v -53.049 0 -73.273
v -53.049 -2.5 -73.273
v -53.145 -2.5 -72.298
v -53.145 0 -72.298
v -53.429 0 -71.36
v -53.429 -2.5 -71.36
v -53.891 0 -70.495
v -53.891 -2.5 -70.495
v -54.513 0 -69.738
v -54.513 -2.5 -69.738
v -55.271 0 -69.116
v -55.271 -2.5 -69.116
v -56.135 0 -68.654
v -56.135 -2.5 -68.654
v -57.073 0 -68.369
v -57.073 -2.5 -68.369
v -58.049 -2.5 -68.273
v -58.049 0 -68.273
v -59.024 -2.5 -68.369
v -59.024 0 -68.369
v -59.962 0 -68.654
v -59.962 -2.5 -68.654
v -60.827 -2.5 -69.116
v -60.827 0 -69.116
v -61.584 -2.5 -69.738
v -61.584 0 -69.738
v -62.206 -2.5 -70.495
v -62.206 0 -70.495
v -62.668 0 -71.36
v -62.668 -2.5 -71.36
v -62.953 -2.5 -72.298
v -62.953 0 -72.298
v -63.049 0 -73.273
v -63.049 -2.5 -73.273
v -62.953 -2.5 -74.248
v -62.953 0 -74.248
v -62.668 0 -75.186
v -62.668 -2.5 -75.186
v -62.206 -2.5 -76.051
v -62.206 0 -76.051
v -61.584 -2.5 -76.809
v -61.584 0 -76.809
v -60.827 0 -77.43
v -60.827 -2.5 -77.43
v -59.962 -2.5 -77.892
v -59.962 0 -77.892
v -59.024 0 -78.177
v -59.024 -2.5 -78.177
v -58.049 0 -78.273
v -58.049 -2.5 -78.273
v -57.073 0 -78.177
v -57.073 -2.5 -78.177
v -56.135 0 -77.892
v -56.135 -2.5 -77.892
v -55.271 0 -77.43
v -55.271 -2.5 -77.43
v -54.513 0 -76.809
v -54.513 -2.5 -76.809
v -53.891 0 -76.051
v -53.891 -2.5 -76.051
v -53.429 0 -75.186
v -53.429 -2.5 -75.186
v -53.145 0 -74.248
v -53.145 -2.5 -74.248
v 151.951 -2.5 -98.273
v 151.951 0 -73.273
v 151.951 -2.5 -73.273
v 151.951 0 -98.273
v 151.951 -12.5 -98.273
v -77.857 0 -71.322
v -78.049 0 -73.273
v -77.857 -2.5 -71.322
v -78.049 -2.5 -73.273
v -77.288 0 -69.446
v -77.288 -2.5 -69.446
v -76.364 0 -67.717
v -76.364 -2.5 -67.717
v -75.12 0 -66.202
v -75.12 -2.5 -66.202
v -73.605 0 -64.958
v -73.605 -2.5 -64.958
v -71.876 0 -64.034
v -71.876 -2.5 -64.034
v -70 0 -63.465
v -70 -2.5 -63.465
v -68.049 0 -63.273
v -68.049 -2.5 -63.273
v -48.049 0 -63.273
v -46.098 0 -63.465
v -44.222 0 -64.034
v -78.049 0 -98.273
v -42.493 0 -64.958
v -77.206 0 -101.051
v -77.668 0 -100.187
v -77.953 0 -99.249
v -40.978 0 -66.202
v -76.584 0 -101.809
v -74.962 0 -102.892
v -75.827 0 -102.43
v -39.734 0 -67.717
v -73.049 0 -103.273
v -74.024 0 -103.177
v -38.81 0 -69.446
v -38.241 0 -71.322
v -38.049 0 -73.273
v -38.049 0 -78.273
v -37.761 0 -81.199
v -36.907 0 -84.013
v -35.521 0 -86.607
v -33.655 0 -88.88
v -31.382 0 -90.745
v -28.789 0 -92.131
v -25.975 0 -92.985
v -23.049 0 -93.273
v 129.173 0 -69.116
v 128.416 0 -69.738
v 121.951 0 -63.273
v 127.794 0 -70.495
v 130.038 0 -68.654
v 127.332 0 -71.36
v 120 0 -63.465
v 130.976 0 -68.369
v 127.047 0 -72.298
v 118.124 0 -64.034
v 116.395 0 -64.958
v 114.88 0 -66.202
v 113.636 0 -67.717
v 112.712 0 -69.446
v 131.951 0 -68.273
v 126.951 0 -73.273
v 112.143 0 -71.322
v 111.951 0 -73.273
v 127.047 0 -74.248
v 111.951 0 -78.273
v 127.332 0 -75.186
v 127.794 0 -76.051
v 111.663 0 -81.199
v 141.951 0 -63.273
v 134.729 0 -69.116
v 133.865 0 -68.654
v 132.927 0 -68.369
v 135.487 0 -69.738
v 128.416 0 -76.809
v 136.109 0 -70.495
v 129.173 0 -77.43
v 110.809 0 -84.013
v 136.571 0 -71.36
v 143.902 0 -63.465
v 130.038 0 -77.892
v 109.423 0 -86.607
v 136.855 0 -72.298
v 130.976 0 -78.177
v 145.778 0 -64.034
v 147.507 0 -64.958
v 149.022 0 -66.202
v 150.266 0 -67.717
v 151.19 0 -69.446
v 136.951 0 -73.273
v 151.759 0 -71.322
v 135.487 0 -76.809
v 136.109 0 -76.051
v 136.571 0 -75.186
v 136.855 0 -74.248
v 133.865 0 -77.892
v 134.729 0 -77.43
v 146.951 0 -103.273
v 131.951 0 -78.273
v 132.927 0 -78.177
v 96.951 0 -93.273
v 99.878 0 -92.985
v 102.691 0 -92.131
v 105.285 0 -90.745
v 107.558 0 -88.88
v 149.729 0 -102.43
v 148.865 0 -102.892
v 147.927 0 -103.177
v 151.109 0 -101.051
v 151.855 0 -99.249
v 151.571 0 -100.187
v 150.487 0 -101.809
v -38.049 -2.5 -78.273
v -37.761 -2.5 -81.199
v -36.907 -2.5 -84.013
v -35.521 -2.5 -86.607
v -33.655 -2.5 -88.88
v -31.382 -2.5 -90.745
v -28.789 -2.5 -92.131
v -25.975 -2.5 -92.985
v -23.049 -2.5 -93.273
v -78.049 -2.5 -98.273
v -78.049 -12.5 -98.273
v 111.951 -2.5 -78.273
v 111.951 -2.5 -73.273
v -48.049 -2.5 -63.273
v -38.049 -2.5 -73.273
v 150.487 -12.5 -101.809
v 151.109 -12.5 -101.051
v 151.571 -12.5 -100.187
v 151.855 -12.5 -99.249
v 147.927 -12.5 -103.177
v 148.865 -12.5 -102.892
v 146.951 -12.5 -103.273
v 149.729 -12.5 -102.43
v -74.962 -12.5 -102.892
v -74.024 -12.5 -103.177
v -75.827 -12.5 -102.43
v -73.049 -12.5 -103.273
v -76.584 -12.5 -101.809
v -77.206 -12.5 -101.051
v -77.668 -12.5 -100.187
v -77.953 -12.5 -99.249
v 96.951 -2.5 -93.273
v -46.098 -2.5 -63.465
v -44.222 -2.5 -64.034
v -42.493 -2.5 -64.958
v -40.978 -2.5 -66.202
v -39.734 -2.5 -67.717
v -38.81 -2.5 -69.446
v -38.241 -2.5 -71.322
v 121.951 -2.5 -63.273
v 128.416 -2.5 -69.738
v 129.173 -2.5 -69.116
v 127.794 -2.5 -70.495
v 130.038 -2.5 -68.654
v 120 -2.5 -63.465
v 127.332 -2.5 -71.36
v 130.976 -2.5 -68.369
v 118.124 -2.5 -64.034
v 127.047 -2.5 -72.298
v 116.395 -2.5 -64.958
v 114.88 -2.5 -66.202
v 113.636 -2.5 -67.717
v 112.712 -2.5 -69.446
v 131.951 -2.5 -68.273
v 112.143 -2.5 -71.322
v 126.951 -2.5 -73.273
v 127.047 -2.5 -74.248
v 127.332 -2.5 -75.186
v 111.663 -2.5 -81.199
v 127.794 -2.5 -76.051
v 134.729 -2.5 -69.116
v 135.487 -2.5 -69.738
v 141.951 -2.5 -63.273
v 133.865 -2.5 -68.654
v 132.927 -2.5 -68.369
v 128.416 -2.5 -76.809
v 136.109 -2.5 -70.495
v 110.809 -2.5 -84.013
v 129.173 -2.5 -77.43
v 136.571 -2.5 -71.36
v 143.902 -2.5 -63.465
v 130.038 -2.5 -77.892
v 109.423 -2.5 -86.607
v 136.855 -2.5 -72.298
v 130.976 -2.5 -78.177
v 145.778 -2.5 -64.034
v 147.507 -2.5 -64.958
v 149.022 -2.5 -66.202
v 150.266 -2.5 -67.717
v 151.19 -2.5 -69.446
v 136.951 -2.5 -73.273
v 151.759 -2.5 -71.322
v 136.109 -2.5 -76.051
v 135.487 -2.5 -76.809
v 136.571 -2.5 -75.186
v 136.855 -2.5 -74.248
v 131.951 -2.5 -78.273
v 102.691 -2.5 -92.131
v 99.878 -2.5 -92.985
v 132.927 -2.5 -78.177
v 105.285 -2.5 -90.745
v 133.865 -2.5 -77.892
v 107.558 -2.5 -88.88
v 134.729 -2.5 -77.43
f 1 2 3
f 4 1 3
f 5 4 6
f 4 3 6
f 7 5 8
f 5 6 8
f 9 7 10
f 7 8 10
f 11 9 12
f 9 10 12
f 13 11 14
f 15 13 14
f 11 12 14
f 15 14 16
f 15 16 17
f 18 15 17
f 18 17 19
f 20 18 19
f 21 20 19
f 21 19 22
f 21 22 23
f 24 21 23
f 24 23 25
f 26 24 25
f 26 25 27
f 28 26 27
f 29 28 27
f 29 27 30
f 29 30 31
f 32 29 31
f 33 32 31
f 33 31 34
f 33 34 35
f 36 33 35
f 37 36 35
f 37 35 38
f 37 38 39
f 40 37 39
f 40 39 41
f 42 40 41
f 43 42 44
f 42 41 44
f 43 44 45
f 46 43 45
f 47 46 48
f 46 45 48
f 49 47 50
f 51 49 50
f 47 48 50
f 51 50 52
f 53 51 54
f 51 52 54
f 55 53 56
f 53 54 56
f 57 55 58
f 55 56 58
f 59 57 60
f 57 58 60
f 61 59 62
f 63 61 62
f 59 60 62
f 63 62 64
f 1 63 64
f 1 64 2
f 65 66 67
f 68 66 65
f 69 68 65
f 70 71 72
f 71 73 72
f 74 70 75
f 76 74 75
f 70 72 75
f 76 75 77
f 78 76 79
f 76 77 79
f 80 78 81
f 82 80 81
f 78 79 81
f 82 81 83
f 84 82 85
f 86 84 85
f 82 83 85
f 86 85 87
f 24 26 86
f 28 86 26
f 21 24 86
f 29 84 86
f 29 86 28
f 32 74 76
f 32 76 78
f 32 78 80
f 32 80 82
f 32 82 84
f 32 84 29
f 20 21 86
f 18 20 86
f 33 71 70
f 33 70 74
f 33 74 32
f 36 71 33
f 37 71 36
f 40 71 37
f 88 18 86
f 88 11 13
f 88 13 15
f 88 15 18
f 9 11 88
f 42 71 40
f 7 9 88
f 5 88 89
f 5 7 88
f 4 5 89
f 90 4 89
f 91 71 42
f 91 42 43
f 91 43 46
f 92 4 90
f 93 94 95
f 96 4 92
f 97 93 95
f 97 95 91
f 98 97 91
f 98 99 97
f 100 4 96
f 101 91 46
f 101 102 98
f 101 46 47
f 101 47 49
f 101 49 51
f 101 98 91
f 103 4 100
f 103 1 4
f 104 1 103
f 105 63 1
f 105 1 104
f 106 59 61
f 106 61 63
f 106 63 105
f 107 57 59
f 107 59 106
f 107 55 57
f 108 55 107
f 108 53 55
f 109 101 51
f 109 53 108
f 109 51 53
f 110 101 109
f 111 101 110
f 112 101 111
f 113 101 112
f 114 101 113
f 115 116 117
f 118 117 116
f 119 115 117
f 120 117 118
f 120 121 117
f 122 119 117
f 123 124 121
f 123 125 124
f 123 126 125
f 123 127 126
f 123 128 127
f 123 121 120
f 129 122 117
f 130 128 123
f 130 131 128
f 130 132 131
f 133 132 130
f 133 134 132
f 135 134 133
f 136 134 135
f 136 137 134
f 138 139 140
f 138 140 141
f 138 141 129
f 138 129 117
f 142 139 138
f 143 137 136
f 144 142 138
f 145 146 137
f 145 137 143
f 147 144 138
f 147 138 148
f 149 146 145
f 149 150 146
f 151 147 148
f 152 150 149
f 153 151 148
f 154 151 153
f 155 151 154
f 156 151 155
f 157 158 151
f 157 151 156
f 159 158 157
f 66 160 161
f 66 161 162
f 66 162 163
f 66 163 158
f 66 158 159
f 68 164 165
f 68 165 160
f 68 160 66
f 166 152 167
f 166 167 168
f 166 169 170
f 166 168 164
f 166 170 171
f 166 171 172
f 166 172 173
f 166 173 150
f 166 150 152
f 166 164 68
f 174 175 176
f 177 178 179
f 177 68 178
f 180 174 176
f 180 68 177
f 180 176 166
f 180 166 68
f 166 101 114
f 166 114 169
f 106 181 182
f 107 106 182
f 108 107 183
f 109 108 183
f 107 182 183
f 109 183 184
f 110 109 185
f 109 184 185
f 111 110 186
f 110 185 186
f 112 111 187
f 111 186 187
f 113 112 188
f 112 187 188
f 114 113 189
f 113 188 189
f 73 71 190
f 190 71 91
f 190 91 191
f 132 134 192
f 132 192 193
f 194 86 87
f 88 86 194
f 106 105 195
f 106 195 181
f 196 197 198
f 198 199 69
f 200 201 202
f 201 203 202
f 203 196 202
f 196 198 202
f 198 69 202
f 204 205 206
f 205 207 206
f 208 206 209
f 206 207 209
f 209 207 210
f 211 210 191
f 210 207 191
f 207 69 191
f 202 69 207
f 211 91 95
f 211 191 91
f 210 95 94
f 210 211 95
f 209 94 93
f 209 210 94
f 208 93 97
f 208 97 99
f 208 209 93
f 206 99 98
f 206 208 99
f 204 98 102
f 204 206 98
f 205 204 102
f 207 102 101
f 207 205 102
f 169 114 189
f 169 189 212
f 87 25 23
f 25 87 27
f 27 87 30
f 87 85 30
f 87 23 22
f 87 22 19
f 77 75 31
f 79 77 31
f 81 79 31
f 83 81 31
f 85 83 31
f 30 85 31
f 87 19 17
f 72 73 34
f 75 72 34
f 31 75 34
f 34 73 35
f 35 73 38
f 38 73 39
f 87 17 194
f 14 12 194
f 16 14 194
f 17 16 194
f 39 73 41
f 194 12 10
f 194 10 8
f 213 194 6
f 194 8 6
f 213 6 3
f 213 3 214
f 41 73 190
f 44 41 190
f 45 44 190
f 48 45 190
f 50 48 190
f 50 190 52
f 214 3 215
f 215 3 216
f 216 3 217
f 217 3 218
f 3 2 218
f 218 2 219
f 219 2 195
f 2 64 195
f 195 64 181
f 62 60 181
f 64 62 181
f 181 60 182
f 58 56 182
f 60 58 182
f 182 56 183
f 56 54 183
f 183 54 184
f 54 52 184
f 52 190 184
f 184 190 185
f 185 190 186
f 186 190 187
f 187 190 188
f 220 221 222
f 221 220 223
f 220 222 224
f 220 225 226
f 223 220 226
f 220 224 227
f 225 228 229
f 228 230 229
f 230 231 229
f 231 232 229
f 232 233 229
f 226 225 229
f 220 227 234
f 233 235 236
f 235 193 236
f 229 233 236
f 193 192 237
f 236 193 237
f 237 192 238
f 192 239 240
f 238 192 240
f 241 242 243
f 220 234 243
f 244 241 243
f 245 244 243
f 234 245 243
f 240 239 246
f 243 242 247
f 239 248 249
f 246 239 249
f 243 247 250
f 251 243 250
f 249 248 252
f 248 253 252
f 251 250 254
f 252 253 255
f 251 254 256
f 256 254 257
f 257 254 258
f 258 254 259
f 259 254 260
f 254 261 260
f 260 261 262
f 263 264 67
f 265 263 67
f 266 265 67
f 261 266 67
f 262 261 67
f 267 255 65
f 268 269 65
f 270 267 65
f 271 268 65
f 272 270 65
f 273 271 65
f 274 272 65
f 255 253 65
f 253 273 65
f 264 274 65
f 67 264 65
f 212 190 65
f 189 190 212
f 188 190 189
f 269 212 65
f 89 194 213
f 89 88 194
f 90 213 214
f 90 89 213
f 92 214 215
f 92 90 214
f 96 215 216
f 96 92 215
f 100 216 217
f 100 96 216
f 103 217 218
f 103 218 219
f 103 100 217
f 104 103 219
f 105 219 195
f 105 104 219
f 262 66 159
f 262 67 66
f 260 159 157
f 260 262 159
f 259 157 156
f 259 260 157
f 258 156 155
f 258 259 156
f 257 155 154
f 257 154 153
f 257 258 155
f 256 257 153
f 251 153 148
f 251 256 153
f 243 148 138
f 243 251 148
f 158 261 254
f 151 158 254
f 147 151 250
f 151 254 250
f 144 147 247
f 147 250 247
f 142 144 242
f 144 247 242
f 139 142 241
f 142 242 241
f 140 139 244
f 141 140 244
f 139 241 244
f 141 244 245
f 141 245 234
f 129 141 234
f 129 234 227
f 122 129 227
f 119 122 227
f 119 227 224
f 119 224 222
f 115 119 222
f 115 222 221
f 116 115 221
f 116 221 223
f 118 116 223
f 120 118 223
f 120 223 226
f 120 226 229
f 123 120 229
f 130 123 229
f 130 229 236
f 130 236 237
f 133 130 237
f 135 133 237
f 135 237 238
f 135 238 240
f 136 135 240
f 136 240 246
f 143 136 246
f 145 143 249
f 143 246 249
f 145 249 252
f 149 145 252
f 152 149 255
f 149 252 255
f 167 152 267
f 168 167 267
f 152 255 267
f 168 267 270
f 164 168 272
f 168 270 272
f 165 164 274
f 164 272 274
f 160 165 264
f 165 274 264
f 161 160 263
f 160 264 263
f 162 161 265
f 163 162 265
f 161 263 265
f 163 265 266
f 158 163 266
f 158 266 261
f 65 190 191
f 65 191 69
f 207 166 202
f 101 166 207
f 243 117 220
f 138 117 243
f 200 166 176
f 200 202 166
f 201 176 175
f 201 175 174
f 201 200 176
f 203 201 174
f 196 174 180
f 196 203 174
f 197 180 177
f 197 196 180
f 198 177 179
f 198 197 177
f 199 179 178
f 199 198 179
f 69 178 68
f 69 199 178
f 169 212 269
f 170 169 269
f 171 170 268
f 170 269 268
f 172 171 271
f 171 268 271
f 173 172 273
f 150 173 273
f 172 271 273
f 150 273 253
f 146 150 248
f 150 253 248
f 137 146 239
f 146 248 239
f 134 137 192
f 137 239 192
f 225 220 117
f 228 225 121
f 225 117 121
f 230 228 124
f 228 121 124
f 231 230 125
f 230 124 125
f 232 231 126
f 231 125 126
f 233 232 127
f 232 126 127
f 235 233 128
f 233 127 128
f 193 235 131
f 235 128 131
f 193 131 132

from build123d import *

# Parameters (mm, degrees)
BOSS_EXTRUDE2_DEPTH = 40
SKETCH2_W           = 50
SKETCH2_H           = 35
CUT_EXTRUDE1_DEPTH  = 45
SKETCH3_W           = 50
SKETCH3_H           = 35
CUT_EXTRUDE2_DEPTH  = 45
SKETCH4_W           = 150
SKETCH4_H           = 35
CUT_EXTRUDE3_DEPTH  = 5
CUT_EXTRUDE4_DEPTH  = 50
BOSS_EXTRUDE3_DEPTH = 2.5
BOSS_EXTRUDE4_START = -2.5
BOSS_EXTRUDE4_DEPTH = 2.5
SKETCH10_R          = 7.5
CUT_EXTRUDE5_DEPTH  = 50
CUT_EXTRUDE7_DEPTH  = 10
SKETCH12_W          = 250.559183642
SKETCH12_H          = 50.914019983
CUT_EXTRUDE8_DEPTH  = 10
SKETCH14_R          = 7.5
BOSS_EXTRUDE5_DEPTH = 2.5
SKETCH15_W          = 12.944399718
SKETCH15_H          = 51.5357406
SKETCH15_W_2        = 21.188165756
SKETCH15_H_2        = 60.611007318
CUT_EXTRUDE9_DEPTH  = 50
SKETCH17_W          = 230
SKETCH17_H          = 10
CUT_EXTRUDE10_DEPTH = 50
FILLET3_R           = 5
FILLET4_R           = 10
SKETCH18_R          = 5
CUT_EXTRUDE11_DEPTH = 50


with BuildPart() as part:
    # Sketch1 → Boss-Extrude2 (new body)
    with BuildSketch(Plane(origin=(0, 0, 0), x_dir=(1, 0, 0), z_dir=(0, 1, 0))):
        Polygon((36.951161, 103.273036008), (-88.048839, 103.273036008), (-88.048839, 53.273036008), (-38.048839, 53.273036008), (-38.048839, 93.273036008), (36.951161, 93.273036008), align=None)
        Polygon((161.951161, 103.273036008), (36.951161, 103.273036008), (36.951161, 93.273036008), (111.951161, 93.273036008), (111.951161, 53.273036008), (161.951161, 53.273036008), align=None)
    extrude(amount=-BOSS_EXTRUDE2_DEPTH)

    # Sketch2 → Cut-Extrude1 (cut)
    with BuildSketch(Plane.XY.offset(-53.273036008)):
        with Locations((-63.048839, -20)):
            Rectangle(SKETCH2_W, SKETCH2_H)
    extrude(amount=-CUT_EXTRUDE1_DEPTH, mode=Mode.SUBTRACT)

    # Sketch3 → Cut-Extrude2 (cut)
    with BuildSketch(Plane.XY.offset(-53.273036008)):
        with Locations((136.951161, -20)):
            Rectangle(SKETCH3_W, SKETCH3_H)
    extrude(amount=-CUT_EXTRUDE2_DEPTH, mode=Mode.SUBTRACT)

    # Sketch4 → Cut-Extrude3 (cut)
    with BuildSketch(Plane.XY.offset(-93.273036008)):
        with Locations((36.951161, -20)):
            Rectangle(SKETCH4_W, SKETCH4_H)
    extrude(amount=-CUT_EXTRUDE3_DEPTH, mode=Mode.SUBTRACT)

    # Sketch5 → Cut-Extrude4 (cut)
    with BuildSketch(Plane.XZ.offset(40)):
        with BuildLine():
            ThreePointArc((-80.548839, -103.273036008), (-85.852139859, -101.076336867), (-88.048839, -95.773036008))
            Line((-88.048839, -95.773036008), (-88.048839, -103.273036008))
            Line((-88.048839, -103.273036008), (-80.548839, -103.273036008))
        make_face()
        with BuildLine():
            ThreePointArc((-88.048839, -63.273036008), (-85.119906812, -56.201968196), (-78.048839, -53.273036008))
            Line((-78.048839, -53.273036008), (-88.048839, -53.273036008))
            Line((-88.048839, -53.273036008), (-88.048839, -63.273036008))
        make_face()
        with BuildLine():
            ThreePointArc((-48.048839, -53.273036008), (-40.977771189, -56.201968196), (-38.048839, -63.273036008))
            Line((-38.048839, -63.273036008), (-38.048839, -53.273036008))
            Line((-38.048839, -53.273036008), (-48.048839, -53.273036008))
        make_face()
        with BuildLine():
            Line((111.951161, -53.273036008), (111.951161, -63.273036008))
            ThreePointArc((111.951161, -63.273036008), (114.880093188, -56.201968196), (121.951161, -53.273036008))
            Line((121.951161, -53.273036008), (111.951161, -53.273036008))
        make_face()
        with BuildLine():
            Line((161.951161, -53.273036008), (151.951161, -53.273036008))
            ThreePointArc((151.951161, -53.273036008), (159.022228811, -56.201968196), (161.951161, -63.273036008))
            Line((161.951161, -63.273036008), (161.951161, -53.273036008))
        make_face()
        with BuildLine():
            ThreePointArc((161.951161, -95.773036008), (159.754461858, -101.076336867), (154.451161, -103.273036008))
            Line((154.451161, -103.273036008), (161.951161, -103.273036008))
            Line((161.951161, -103.273036008), (161.951161, -95.773036008))
        make_face()
    extrude(amount=-CUT_EXTRUDE4_DEPTH, mode=Mode.SUBTRACT)

    # Sketch8 → Boss-Extrude3 (add)
    with BuildSketch(Plane.XZ.offset(40)):
        with BuildLine():
            Line((-38.048839, -93.273036008), (-23.048839, -93.273036008))
            ThreePointArc((-23.048839, -93.273036008), (-33.655440718, -88.879637726), (-38.048839, -78.273036008))
            Line((-38.048839, -78.273036008), (-38.048839, -93.273036008))
        make_face()
        with BuildLine():
            ThreePointArc((111.951161, -78.273036008), (107.557762717, -88.879637726), (96.951161, -93.273036008))
            Line((96.951161, -93.273036008), (111.951161, -93.273036008))
            Line((111.951161, -93.273036008), (111.951161, -78.273036008))
        make_face()
    extrude(amount=-BOSS_EXTRUDE3_DEPTH)

    # Sketch9 → Boss-Extrude4 (add)
    with BuildSketch(Plane(origin=(0, 0, 0), x_dir=(1, 0, 0), z_dir=(0, 1, 0)).offset(BOSS_EXTRUDE4_START)):
        with BuildLine():
            Line((111.951161, 93.273036008), (96.951161, 93.273036008))
            ThreePointArc((96.951161, 93.273036008), (107.557762717, 88.879637726), (111.951161, 78.273036008))
            Line((111.951161, 78.273036008), (111.951161, 93.273036008))
        make_face()
        with BuildLine():
            ThreePointArc((-38.048839, 78.273036008), (-33.655440718, 88.879637726), (-23.048839, 93.273036008))
            Line((-23.048839, 93.273036008), (-38.048839, 93.273036008))
            Line((-38.048839, 93.273036008), (-38.048839, 78.273036008))
        make_face()
    extrude(amount=BOSS_EXTRUDE4_DEPTH)

    # Sketch10 → Cut-Extrude5 (cut)
    with BuildSketch(Plane(origin=(0, 0, 0), x_dir=(1, 0, 0), z_dir=(0, 1, 0))):
        with Locations(Location((-62.665129015, 73.273036008, 0), (0, 0, 270))):
            Circle(SKETCH10_R)
        with Locations(Location((136.567451014, 73.273036008, 0), (0, 0, 180))):
            Circle(SKETCH10_R)
    extrude(amount=-CUT_EXTRUDE5_DEPTH, mode=Mode.SUBTRACT)

    # Sketch11 → Cut-Extrude7 (cut)
    with BuildSketch(Plane.XY.offset(-98.273036008)):
        Polygon((161.522228811, -12.5), (-87.619906812, -12.5), (-87.619906812, -16.066465668), (-87.619906812, -37.5), (161.522228811, -37.5), (161.522228811, -16.066465668), align=None)
    extrude(amount=-CUT_EXTRUDE7_DEPTH, mode=Mode.SUBTRACT)


with BuildPart() as cut_extrude7_piece_1:
    # of the separate pieces the step leaves, piece 1, a body of its own (cut_extrude7_pieces)
    add(part.part.solids().sort_by_distance((-80.548839, -12.5, -103.273036008))[0])

    # Sketch14 → Boss-Extrude5 (add)
    with BuildSketch(Plane(origin=(0, 0, 0), x_dir=(1, 0, 0), z_dir=(0, 1, 0))):
        with Locations((-62.665129015, 73.273036008)):
            Circle(SKETCH14_R)
        with Locations((136.567451014, 73.273036008)):
            Circle(SKETCH14_R)
    extrude(amount=-BOSS_EXTRUDE5_DEPTH)

    # Sketch15 → Cut-Extrude9 (cut)
    with BuildSketch(Plane(origin=(0, 0, 0), x_dir=(1, 0, 0), z_dir=(0, 1, 0))):
        with Locations((-84.521038859, 78.400798504)):
            Rectangle(SKETCH15_W, SKETCH15_H)
        with Locations((162.545243878, 78.525177745)):
            Rectangle(SKETCH15_W_2, SKETCH15_H_2)
    extrude(amount=-CUT_EXTRUDE9_DEPTH, mode=Mode.SUBTRACT)

    # Sketch17 → Cut-Extrude10 (cut)
    with BuildSketch(Plane(origin=(0, 0, 0), x_dir=(1, 0, 0), z_dir=(0, 1, 0))):
        with Locations((36.951161, 58.273036008)):
            Rectangle(SKETCH17_W, SKETCH17_H)
    extrude(amount=-CUT_EXTRUDE10_DEPTH, mode=Mode.SUBTRACT)

    # Fillet3
    fillet3_edges = [cut_extrude7_piece_1.edges().sort_by_distance(p)[0] for p in [
        (151.951161, -6.25, -103.273036008),
        (-78.048839, -6.25, -103.273036008),
    ]]
    fillet(fillet3_edges, radius=FILLET3_R - 0.0001)  # a hair under: the kernel refuses the full size

    # Fillet4
    fillet4_edges = [cut_extrude7_piece_1.edges().sort_by_distance(p)[0] for p in [
        (151.951161, -1.25, -63.273036008),
        (-38.048839, -1.25, -63.273036008),
        (111.951161, -1.25, -63.273036008),
        (-78.048839, -1.25, -63.273036008),
    ]]
    fillet(fillet4_edges, radius=FILLET4_R)

    # Sketch18 → Cut-Extrude11 (cut)
    with BuildSketch(Plane.XZ.offset(2.5)):
        with Locations((131.951161, -73.273036008)):
            Circle(SKETCH18_R)
        with Locations((-58.048839, -73.273036008)):
            Circle(SKETCH18_R)
    extrude(amount=-CUT_EXTRUDE11_DEPTH, mode=Mode.SUBTRACT)


with BuildPart() as cut_extrude7_piece_2:
    # of the separate pieces the step leaves, piece 2, a body of its own (cut_extrude7_pieces)
    add(part.part.solids().sort_by_distance((154.451161, -40, -103.273036008))[0])

    # Sketch12 → Cut-Extrude8 (cut)
    with BuildSketch(Plane.XZ.offset(40)):
        with Locations((37.230752821, -78.730046)):
            Rectangle(SKETCH12_W, SKETCH12_H)
    extrude(amount=-CUT_EXTRUDE8_DEPTH, mode=Mode.SUBTRACT)


solid = cut_extrude7_piece_1.part
